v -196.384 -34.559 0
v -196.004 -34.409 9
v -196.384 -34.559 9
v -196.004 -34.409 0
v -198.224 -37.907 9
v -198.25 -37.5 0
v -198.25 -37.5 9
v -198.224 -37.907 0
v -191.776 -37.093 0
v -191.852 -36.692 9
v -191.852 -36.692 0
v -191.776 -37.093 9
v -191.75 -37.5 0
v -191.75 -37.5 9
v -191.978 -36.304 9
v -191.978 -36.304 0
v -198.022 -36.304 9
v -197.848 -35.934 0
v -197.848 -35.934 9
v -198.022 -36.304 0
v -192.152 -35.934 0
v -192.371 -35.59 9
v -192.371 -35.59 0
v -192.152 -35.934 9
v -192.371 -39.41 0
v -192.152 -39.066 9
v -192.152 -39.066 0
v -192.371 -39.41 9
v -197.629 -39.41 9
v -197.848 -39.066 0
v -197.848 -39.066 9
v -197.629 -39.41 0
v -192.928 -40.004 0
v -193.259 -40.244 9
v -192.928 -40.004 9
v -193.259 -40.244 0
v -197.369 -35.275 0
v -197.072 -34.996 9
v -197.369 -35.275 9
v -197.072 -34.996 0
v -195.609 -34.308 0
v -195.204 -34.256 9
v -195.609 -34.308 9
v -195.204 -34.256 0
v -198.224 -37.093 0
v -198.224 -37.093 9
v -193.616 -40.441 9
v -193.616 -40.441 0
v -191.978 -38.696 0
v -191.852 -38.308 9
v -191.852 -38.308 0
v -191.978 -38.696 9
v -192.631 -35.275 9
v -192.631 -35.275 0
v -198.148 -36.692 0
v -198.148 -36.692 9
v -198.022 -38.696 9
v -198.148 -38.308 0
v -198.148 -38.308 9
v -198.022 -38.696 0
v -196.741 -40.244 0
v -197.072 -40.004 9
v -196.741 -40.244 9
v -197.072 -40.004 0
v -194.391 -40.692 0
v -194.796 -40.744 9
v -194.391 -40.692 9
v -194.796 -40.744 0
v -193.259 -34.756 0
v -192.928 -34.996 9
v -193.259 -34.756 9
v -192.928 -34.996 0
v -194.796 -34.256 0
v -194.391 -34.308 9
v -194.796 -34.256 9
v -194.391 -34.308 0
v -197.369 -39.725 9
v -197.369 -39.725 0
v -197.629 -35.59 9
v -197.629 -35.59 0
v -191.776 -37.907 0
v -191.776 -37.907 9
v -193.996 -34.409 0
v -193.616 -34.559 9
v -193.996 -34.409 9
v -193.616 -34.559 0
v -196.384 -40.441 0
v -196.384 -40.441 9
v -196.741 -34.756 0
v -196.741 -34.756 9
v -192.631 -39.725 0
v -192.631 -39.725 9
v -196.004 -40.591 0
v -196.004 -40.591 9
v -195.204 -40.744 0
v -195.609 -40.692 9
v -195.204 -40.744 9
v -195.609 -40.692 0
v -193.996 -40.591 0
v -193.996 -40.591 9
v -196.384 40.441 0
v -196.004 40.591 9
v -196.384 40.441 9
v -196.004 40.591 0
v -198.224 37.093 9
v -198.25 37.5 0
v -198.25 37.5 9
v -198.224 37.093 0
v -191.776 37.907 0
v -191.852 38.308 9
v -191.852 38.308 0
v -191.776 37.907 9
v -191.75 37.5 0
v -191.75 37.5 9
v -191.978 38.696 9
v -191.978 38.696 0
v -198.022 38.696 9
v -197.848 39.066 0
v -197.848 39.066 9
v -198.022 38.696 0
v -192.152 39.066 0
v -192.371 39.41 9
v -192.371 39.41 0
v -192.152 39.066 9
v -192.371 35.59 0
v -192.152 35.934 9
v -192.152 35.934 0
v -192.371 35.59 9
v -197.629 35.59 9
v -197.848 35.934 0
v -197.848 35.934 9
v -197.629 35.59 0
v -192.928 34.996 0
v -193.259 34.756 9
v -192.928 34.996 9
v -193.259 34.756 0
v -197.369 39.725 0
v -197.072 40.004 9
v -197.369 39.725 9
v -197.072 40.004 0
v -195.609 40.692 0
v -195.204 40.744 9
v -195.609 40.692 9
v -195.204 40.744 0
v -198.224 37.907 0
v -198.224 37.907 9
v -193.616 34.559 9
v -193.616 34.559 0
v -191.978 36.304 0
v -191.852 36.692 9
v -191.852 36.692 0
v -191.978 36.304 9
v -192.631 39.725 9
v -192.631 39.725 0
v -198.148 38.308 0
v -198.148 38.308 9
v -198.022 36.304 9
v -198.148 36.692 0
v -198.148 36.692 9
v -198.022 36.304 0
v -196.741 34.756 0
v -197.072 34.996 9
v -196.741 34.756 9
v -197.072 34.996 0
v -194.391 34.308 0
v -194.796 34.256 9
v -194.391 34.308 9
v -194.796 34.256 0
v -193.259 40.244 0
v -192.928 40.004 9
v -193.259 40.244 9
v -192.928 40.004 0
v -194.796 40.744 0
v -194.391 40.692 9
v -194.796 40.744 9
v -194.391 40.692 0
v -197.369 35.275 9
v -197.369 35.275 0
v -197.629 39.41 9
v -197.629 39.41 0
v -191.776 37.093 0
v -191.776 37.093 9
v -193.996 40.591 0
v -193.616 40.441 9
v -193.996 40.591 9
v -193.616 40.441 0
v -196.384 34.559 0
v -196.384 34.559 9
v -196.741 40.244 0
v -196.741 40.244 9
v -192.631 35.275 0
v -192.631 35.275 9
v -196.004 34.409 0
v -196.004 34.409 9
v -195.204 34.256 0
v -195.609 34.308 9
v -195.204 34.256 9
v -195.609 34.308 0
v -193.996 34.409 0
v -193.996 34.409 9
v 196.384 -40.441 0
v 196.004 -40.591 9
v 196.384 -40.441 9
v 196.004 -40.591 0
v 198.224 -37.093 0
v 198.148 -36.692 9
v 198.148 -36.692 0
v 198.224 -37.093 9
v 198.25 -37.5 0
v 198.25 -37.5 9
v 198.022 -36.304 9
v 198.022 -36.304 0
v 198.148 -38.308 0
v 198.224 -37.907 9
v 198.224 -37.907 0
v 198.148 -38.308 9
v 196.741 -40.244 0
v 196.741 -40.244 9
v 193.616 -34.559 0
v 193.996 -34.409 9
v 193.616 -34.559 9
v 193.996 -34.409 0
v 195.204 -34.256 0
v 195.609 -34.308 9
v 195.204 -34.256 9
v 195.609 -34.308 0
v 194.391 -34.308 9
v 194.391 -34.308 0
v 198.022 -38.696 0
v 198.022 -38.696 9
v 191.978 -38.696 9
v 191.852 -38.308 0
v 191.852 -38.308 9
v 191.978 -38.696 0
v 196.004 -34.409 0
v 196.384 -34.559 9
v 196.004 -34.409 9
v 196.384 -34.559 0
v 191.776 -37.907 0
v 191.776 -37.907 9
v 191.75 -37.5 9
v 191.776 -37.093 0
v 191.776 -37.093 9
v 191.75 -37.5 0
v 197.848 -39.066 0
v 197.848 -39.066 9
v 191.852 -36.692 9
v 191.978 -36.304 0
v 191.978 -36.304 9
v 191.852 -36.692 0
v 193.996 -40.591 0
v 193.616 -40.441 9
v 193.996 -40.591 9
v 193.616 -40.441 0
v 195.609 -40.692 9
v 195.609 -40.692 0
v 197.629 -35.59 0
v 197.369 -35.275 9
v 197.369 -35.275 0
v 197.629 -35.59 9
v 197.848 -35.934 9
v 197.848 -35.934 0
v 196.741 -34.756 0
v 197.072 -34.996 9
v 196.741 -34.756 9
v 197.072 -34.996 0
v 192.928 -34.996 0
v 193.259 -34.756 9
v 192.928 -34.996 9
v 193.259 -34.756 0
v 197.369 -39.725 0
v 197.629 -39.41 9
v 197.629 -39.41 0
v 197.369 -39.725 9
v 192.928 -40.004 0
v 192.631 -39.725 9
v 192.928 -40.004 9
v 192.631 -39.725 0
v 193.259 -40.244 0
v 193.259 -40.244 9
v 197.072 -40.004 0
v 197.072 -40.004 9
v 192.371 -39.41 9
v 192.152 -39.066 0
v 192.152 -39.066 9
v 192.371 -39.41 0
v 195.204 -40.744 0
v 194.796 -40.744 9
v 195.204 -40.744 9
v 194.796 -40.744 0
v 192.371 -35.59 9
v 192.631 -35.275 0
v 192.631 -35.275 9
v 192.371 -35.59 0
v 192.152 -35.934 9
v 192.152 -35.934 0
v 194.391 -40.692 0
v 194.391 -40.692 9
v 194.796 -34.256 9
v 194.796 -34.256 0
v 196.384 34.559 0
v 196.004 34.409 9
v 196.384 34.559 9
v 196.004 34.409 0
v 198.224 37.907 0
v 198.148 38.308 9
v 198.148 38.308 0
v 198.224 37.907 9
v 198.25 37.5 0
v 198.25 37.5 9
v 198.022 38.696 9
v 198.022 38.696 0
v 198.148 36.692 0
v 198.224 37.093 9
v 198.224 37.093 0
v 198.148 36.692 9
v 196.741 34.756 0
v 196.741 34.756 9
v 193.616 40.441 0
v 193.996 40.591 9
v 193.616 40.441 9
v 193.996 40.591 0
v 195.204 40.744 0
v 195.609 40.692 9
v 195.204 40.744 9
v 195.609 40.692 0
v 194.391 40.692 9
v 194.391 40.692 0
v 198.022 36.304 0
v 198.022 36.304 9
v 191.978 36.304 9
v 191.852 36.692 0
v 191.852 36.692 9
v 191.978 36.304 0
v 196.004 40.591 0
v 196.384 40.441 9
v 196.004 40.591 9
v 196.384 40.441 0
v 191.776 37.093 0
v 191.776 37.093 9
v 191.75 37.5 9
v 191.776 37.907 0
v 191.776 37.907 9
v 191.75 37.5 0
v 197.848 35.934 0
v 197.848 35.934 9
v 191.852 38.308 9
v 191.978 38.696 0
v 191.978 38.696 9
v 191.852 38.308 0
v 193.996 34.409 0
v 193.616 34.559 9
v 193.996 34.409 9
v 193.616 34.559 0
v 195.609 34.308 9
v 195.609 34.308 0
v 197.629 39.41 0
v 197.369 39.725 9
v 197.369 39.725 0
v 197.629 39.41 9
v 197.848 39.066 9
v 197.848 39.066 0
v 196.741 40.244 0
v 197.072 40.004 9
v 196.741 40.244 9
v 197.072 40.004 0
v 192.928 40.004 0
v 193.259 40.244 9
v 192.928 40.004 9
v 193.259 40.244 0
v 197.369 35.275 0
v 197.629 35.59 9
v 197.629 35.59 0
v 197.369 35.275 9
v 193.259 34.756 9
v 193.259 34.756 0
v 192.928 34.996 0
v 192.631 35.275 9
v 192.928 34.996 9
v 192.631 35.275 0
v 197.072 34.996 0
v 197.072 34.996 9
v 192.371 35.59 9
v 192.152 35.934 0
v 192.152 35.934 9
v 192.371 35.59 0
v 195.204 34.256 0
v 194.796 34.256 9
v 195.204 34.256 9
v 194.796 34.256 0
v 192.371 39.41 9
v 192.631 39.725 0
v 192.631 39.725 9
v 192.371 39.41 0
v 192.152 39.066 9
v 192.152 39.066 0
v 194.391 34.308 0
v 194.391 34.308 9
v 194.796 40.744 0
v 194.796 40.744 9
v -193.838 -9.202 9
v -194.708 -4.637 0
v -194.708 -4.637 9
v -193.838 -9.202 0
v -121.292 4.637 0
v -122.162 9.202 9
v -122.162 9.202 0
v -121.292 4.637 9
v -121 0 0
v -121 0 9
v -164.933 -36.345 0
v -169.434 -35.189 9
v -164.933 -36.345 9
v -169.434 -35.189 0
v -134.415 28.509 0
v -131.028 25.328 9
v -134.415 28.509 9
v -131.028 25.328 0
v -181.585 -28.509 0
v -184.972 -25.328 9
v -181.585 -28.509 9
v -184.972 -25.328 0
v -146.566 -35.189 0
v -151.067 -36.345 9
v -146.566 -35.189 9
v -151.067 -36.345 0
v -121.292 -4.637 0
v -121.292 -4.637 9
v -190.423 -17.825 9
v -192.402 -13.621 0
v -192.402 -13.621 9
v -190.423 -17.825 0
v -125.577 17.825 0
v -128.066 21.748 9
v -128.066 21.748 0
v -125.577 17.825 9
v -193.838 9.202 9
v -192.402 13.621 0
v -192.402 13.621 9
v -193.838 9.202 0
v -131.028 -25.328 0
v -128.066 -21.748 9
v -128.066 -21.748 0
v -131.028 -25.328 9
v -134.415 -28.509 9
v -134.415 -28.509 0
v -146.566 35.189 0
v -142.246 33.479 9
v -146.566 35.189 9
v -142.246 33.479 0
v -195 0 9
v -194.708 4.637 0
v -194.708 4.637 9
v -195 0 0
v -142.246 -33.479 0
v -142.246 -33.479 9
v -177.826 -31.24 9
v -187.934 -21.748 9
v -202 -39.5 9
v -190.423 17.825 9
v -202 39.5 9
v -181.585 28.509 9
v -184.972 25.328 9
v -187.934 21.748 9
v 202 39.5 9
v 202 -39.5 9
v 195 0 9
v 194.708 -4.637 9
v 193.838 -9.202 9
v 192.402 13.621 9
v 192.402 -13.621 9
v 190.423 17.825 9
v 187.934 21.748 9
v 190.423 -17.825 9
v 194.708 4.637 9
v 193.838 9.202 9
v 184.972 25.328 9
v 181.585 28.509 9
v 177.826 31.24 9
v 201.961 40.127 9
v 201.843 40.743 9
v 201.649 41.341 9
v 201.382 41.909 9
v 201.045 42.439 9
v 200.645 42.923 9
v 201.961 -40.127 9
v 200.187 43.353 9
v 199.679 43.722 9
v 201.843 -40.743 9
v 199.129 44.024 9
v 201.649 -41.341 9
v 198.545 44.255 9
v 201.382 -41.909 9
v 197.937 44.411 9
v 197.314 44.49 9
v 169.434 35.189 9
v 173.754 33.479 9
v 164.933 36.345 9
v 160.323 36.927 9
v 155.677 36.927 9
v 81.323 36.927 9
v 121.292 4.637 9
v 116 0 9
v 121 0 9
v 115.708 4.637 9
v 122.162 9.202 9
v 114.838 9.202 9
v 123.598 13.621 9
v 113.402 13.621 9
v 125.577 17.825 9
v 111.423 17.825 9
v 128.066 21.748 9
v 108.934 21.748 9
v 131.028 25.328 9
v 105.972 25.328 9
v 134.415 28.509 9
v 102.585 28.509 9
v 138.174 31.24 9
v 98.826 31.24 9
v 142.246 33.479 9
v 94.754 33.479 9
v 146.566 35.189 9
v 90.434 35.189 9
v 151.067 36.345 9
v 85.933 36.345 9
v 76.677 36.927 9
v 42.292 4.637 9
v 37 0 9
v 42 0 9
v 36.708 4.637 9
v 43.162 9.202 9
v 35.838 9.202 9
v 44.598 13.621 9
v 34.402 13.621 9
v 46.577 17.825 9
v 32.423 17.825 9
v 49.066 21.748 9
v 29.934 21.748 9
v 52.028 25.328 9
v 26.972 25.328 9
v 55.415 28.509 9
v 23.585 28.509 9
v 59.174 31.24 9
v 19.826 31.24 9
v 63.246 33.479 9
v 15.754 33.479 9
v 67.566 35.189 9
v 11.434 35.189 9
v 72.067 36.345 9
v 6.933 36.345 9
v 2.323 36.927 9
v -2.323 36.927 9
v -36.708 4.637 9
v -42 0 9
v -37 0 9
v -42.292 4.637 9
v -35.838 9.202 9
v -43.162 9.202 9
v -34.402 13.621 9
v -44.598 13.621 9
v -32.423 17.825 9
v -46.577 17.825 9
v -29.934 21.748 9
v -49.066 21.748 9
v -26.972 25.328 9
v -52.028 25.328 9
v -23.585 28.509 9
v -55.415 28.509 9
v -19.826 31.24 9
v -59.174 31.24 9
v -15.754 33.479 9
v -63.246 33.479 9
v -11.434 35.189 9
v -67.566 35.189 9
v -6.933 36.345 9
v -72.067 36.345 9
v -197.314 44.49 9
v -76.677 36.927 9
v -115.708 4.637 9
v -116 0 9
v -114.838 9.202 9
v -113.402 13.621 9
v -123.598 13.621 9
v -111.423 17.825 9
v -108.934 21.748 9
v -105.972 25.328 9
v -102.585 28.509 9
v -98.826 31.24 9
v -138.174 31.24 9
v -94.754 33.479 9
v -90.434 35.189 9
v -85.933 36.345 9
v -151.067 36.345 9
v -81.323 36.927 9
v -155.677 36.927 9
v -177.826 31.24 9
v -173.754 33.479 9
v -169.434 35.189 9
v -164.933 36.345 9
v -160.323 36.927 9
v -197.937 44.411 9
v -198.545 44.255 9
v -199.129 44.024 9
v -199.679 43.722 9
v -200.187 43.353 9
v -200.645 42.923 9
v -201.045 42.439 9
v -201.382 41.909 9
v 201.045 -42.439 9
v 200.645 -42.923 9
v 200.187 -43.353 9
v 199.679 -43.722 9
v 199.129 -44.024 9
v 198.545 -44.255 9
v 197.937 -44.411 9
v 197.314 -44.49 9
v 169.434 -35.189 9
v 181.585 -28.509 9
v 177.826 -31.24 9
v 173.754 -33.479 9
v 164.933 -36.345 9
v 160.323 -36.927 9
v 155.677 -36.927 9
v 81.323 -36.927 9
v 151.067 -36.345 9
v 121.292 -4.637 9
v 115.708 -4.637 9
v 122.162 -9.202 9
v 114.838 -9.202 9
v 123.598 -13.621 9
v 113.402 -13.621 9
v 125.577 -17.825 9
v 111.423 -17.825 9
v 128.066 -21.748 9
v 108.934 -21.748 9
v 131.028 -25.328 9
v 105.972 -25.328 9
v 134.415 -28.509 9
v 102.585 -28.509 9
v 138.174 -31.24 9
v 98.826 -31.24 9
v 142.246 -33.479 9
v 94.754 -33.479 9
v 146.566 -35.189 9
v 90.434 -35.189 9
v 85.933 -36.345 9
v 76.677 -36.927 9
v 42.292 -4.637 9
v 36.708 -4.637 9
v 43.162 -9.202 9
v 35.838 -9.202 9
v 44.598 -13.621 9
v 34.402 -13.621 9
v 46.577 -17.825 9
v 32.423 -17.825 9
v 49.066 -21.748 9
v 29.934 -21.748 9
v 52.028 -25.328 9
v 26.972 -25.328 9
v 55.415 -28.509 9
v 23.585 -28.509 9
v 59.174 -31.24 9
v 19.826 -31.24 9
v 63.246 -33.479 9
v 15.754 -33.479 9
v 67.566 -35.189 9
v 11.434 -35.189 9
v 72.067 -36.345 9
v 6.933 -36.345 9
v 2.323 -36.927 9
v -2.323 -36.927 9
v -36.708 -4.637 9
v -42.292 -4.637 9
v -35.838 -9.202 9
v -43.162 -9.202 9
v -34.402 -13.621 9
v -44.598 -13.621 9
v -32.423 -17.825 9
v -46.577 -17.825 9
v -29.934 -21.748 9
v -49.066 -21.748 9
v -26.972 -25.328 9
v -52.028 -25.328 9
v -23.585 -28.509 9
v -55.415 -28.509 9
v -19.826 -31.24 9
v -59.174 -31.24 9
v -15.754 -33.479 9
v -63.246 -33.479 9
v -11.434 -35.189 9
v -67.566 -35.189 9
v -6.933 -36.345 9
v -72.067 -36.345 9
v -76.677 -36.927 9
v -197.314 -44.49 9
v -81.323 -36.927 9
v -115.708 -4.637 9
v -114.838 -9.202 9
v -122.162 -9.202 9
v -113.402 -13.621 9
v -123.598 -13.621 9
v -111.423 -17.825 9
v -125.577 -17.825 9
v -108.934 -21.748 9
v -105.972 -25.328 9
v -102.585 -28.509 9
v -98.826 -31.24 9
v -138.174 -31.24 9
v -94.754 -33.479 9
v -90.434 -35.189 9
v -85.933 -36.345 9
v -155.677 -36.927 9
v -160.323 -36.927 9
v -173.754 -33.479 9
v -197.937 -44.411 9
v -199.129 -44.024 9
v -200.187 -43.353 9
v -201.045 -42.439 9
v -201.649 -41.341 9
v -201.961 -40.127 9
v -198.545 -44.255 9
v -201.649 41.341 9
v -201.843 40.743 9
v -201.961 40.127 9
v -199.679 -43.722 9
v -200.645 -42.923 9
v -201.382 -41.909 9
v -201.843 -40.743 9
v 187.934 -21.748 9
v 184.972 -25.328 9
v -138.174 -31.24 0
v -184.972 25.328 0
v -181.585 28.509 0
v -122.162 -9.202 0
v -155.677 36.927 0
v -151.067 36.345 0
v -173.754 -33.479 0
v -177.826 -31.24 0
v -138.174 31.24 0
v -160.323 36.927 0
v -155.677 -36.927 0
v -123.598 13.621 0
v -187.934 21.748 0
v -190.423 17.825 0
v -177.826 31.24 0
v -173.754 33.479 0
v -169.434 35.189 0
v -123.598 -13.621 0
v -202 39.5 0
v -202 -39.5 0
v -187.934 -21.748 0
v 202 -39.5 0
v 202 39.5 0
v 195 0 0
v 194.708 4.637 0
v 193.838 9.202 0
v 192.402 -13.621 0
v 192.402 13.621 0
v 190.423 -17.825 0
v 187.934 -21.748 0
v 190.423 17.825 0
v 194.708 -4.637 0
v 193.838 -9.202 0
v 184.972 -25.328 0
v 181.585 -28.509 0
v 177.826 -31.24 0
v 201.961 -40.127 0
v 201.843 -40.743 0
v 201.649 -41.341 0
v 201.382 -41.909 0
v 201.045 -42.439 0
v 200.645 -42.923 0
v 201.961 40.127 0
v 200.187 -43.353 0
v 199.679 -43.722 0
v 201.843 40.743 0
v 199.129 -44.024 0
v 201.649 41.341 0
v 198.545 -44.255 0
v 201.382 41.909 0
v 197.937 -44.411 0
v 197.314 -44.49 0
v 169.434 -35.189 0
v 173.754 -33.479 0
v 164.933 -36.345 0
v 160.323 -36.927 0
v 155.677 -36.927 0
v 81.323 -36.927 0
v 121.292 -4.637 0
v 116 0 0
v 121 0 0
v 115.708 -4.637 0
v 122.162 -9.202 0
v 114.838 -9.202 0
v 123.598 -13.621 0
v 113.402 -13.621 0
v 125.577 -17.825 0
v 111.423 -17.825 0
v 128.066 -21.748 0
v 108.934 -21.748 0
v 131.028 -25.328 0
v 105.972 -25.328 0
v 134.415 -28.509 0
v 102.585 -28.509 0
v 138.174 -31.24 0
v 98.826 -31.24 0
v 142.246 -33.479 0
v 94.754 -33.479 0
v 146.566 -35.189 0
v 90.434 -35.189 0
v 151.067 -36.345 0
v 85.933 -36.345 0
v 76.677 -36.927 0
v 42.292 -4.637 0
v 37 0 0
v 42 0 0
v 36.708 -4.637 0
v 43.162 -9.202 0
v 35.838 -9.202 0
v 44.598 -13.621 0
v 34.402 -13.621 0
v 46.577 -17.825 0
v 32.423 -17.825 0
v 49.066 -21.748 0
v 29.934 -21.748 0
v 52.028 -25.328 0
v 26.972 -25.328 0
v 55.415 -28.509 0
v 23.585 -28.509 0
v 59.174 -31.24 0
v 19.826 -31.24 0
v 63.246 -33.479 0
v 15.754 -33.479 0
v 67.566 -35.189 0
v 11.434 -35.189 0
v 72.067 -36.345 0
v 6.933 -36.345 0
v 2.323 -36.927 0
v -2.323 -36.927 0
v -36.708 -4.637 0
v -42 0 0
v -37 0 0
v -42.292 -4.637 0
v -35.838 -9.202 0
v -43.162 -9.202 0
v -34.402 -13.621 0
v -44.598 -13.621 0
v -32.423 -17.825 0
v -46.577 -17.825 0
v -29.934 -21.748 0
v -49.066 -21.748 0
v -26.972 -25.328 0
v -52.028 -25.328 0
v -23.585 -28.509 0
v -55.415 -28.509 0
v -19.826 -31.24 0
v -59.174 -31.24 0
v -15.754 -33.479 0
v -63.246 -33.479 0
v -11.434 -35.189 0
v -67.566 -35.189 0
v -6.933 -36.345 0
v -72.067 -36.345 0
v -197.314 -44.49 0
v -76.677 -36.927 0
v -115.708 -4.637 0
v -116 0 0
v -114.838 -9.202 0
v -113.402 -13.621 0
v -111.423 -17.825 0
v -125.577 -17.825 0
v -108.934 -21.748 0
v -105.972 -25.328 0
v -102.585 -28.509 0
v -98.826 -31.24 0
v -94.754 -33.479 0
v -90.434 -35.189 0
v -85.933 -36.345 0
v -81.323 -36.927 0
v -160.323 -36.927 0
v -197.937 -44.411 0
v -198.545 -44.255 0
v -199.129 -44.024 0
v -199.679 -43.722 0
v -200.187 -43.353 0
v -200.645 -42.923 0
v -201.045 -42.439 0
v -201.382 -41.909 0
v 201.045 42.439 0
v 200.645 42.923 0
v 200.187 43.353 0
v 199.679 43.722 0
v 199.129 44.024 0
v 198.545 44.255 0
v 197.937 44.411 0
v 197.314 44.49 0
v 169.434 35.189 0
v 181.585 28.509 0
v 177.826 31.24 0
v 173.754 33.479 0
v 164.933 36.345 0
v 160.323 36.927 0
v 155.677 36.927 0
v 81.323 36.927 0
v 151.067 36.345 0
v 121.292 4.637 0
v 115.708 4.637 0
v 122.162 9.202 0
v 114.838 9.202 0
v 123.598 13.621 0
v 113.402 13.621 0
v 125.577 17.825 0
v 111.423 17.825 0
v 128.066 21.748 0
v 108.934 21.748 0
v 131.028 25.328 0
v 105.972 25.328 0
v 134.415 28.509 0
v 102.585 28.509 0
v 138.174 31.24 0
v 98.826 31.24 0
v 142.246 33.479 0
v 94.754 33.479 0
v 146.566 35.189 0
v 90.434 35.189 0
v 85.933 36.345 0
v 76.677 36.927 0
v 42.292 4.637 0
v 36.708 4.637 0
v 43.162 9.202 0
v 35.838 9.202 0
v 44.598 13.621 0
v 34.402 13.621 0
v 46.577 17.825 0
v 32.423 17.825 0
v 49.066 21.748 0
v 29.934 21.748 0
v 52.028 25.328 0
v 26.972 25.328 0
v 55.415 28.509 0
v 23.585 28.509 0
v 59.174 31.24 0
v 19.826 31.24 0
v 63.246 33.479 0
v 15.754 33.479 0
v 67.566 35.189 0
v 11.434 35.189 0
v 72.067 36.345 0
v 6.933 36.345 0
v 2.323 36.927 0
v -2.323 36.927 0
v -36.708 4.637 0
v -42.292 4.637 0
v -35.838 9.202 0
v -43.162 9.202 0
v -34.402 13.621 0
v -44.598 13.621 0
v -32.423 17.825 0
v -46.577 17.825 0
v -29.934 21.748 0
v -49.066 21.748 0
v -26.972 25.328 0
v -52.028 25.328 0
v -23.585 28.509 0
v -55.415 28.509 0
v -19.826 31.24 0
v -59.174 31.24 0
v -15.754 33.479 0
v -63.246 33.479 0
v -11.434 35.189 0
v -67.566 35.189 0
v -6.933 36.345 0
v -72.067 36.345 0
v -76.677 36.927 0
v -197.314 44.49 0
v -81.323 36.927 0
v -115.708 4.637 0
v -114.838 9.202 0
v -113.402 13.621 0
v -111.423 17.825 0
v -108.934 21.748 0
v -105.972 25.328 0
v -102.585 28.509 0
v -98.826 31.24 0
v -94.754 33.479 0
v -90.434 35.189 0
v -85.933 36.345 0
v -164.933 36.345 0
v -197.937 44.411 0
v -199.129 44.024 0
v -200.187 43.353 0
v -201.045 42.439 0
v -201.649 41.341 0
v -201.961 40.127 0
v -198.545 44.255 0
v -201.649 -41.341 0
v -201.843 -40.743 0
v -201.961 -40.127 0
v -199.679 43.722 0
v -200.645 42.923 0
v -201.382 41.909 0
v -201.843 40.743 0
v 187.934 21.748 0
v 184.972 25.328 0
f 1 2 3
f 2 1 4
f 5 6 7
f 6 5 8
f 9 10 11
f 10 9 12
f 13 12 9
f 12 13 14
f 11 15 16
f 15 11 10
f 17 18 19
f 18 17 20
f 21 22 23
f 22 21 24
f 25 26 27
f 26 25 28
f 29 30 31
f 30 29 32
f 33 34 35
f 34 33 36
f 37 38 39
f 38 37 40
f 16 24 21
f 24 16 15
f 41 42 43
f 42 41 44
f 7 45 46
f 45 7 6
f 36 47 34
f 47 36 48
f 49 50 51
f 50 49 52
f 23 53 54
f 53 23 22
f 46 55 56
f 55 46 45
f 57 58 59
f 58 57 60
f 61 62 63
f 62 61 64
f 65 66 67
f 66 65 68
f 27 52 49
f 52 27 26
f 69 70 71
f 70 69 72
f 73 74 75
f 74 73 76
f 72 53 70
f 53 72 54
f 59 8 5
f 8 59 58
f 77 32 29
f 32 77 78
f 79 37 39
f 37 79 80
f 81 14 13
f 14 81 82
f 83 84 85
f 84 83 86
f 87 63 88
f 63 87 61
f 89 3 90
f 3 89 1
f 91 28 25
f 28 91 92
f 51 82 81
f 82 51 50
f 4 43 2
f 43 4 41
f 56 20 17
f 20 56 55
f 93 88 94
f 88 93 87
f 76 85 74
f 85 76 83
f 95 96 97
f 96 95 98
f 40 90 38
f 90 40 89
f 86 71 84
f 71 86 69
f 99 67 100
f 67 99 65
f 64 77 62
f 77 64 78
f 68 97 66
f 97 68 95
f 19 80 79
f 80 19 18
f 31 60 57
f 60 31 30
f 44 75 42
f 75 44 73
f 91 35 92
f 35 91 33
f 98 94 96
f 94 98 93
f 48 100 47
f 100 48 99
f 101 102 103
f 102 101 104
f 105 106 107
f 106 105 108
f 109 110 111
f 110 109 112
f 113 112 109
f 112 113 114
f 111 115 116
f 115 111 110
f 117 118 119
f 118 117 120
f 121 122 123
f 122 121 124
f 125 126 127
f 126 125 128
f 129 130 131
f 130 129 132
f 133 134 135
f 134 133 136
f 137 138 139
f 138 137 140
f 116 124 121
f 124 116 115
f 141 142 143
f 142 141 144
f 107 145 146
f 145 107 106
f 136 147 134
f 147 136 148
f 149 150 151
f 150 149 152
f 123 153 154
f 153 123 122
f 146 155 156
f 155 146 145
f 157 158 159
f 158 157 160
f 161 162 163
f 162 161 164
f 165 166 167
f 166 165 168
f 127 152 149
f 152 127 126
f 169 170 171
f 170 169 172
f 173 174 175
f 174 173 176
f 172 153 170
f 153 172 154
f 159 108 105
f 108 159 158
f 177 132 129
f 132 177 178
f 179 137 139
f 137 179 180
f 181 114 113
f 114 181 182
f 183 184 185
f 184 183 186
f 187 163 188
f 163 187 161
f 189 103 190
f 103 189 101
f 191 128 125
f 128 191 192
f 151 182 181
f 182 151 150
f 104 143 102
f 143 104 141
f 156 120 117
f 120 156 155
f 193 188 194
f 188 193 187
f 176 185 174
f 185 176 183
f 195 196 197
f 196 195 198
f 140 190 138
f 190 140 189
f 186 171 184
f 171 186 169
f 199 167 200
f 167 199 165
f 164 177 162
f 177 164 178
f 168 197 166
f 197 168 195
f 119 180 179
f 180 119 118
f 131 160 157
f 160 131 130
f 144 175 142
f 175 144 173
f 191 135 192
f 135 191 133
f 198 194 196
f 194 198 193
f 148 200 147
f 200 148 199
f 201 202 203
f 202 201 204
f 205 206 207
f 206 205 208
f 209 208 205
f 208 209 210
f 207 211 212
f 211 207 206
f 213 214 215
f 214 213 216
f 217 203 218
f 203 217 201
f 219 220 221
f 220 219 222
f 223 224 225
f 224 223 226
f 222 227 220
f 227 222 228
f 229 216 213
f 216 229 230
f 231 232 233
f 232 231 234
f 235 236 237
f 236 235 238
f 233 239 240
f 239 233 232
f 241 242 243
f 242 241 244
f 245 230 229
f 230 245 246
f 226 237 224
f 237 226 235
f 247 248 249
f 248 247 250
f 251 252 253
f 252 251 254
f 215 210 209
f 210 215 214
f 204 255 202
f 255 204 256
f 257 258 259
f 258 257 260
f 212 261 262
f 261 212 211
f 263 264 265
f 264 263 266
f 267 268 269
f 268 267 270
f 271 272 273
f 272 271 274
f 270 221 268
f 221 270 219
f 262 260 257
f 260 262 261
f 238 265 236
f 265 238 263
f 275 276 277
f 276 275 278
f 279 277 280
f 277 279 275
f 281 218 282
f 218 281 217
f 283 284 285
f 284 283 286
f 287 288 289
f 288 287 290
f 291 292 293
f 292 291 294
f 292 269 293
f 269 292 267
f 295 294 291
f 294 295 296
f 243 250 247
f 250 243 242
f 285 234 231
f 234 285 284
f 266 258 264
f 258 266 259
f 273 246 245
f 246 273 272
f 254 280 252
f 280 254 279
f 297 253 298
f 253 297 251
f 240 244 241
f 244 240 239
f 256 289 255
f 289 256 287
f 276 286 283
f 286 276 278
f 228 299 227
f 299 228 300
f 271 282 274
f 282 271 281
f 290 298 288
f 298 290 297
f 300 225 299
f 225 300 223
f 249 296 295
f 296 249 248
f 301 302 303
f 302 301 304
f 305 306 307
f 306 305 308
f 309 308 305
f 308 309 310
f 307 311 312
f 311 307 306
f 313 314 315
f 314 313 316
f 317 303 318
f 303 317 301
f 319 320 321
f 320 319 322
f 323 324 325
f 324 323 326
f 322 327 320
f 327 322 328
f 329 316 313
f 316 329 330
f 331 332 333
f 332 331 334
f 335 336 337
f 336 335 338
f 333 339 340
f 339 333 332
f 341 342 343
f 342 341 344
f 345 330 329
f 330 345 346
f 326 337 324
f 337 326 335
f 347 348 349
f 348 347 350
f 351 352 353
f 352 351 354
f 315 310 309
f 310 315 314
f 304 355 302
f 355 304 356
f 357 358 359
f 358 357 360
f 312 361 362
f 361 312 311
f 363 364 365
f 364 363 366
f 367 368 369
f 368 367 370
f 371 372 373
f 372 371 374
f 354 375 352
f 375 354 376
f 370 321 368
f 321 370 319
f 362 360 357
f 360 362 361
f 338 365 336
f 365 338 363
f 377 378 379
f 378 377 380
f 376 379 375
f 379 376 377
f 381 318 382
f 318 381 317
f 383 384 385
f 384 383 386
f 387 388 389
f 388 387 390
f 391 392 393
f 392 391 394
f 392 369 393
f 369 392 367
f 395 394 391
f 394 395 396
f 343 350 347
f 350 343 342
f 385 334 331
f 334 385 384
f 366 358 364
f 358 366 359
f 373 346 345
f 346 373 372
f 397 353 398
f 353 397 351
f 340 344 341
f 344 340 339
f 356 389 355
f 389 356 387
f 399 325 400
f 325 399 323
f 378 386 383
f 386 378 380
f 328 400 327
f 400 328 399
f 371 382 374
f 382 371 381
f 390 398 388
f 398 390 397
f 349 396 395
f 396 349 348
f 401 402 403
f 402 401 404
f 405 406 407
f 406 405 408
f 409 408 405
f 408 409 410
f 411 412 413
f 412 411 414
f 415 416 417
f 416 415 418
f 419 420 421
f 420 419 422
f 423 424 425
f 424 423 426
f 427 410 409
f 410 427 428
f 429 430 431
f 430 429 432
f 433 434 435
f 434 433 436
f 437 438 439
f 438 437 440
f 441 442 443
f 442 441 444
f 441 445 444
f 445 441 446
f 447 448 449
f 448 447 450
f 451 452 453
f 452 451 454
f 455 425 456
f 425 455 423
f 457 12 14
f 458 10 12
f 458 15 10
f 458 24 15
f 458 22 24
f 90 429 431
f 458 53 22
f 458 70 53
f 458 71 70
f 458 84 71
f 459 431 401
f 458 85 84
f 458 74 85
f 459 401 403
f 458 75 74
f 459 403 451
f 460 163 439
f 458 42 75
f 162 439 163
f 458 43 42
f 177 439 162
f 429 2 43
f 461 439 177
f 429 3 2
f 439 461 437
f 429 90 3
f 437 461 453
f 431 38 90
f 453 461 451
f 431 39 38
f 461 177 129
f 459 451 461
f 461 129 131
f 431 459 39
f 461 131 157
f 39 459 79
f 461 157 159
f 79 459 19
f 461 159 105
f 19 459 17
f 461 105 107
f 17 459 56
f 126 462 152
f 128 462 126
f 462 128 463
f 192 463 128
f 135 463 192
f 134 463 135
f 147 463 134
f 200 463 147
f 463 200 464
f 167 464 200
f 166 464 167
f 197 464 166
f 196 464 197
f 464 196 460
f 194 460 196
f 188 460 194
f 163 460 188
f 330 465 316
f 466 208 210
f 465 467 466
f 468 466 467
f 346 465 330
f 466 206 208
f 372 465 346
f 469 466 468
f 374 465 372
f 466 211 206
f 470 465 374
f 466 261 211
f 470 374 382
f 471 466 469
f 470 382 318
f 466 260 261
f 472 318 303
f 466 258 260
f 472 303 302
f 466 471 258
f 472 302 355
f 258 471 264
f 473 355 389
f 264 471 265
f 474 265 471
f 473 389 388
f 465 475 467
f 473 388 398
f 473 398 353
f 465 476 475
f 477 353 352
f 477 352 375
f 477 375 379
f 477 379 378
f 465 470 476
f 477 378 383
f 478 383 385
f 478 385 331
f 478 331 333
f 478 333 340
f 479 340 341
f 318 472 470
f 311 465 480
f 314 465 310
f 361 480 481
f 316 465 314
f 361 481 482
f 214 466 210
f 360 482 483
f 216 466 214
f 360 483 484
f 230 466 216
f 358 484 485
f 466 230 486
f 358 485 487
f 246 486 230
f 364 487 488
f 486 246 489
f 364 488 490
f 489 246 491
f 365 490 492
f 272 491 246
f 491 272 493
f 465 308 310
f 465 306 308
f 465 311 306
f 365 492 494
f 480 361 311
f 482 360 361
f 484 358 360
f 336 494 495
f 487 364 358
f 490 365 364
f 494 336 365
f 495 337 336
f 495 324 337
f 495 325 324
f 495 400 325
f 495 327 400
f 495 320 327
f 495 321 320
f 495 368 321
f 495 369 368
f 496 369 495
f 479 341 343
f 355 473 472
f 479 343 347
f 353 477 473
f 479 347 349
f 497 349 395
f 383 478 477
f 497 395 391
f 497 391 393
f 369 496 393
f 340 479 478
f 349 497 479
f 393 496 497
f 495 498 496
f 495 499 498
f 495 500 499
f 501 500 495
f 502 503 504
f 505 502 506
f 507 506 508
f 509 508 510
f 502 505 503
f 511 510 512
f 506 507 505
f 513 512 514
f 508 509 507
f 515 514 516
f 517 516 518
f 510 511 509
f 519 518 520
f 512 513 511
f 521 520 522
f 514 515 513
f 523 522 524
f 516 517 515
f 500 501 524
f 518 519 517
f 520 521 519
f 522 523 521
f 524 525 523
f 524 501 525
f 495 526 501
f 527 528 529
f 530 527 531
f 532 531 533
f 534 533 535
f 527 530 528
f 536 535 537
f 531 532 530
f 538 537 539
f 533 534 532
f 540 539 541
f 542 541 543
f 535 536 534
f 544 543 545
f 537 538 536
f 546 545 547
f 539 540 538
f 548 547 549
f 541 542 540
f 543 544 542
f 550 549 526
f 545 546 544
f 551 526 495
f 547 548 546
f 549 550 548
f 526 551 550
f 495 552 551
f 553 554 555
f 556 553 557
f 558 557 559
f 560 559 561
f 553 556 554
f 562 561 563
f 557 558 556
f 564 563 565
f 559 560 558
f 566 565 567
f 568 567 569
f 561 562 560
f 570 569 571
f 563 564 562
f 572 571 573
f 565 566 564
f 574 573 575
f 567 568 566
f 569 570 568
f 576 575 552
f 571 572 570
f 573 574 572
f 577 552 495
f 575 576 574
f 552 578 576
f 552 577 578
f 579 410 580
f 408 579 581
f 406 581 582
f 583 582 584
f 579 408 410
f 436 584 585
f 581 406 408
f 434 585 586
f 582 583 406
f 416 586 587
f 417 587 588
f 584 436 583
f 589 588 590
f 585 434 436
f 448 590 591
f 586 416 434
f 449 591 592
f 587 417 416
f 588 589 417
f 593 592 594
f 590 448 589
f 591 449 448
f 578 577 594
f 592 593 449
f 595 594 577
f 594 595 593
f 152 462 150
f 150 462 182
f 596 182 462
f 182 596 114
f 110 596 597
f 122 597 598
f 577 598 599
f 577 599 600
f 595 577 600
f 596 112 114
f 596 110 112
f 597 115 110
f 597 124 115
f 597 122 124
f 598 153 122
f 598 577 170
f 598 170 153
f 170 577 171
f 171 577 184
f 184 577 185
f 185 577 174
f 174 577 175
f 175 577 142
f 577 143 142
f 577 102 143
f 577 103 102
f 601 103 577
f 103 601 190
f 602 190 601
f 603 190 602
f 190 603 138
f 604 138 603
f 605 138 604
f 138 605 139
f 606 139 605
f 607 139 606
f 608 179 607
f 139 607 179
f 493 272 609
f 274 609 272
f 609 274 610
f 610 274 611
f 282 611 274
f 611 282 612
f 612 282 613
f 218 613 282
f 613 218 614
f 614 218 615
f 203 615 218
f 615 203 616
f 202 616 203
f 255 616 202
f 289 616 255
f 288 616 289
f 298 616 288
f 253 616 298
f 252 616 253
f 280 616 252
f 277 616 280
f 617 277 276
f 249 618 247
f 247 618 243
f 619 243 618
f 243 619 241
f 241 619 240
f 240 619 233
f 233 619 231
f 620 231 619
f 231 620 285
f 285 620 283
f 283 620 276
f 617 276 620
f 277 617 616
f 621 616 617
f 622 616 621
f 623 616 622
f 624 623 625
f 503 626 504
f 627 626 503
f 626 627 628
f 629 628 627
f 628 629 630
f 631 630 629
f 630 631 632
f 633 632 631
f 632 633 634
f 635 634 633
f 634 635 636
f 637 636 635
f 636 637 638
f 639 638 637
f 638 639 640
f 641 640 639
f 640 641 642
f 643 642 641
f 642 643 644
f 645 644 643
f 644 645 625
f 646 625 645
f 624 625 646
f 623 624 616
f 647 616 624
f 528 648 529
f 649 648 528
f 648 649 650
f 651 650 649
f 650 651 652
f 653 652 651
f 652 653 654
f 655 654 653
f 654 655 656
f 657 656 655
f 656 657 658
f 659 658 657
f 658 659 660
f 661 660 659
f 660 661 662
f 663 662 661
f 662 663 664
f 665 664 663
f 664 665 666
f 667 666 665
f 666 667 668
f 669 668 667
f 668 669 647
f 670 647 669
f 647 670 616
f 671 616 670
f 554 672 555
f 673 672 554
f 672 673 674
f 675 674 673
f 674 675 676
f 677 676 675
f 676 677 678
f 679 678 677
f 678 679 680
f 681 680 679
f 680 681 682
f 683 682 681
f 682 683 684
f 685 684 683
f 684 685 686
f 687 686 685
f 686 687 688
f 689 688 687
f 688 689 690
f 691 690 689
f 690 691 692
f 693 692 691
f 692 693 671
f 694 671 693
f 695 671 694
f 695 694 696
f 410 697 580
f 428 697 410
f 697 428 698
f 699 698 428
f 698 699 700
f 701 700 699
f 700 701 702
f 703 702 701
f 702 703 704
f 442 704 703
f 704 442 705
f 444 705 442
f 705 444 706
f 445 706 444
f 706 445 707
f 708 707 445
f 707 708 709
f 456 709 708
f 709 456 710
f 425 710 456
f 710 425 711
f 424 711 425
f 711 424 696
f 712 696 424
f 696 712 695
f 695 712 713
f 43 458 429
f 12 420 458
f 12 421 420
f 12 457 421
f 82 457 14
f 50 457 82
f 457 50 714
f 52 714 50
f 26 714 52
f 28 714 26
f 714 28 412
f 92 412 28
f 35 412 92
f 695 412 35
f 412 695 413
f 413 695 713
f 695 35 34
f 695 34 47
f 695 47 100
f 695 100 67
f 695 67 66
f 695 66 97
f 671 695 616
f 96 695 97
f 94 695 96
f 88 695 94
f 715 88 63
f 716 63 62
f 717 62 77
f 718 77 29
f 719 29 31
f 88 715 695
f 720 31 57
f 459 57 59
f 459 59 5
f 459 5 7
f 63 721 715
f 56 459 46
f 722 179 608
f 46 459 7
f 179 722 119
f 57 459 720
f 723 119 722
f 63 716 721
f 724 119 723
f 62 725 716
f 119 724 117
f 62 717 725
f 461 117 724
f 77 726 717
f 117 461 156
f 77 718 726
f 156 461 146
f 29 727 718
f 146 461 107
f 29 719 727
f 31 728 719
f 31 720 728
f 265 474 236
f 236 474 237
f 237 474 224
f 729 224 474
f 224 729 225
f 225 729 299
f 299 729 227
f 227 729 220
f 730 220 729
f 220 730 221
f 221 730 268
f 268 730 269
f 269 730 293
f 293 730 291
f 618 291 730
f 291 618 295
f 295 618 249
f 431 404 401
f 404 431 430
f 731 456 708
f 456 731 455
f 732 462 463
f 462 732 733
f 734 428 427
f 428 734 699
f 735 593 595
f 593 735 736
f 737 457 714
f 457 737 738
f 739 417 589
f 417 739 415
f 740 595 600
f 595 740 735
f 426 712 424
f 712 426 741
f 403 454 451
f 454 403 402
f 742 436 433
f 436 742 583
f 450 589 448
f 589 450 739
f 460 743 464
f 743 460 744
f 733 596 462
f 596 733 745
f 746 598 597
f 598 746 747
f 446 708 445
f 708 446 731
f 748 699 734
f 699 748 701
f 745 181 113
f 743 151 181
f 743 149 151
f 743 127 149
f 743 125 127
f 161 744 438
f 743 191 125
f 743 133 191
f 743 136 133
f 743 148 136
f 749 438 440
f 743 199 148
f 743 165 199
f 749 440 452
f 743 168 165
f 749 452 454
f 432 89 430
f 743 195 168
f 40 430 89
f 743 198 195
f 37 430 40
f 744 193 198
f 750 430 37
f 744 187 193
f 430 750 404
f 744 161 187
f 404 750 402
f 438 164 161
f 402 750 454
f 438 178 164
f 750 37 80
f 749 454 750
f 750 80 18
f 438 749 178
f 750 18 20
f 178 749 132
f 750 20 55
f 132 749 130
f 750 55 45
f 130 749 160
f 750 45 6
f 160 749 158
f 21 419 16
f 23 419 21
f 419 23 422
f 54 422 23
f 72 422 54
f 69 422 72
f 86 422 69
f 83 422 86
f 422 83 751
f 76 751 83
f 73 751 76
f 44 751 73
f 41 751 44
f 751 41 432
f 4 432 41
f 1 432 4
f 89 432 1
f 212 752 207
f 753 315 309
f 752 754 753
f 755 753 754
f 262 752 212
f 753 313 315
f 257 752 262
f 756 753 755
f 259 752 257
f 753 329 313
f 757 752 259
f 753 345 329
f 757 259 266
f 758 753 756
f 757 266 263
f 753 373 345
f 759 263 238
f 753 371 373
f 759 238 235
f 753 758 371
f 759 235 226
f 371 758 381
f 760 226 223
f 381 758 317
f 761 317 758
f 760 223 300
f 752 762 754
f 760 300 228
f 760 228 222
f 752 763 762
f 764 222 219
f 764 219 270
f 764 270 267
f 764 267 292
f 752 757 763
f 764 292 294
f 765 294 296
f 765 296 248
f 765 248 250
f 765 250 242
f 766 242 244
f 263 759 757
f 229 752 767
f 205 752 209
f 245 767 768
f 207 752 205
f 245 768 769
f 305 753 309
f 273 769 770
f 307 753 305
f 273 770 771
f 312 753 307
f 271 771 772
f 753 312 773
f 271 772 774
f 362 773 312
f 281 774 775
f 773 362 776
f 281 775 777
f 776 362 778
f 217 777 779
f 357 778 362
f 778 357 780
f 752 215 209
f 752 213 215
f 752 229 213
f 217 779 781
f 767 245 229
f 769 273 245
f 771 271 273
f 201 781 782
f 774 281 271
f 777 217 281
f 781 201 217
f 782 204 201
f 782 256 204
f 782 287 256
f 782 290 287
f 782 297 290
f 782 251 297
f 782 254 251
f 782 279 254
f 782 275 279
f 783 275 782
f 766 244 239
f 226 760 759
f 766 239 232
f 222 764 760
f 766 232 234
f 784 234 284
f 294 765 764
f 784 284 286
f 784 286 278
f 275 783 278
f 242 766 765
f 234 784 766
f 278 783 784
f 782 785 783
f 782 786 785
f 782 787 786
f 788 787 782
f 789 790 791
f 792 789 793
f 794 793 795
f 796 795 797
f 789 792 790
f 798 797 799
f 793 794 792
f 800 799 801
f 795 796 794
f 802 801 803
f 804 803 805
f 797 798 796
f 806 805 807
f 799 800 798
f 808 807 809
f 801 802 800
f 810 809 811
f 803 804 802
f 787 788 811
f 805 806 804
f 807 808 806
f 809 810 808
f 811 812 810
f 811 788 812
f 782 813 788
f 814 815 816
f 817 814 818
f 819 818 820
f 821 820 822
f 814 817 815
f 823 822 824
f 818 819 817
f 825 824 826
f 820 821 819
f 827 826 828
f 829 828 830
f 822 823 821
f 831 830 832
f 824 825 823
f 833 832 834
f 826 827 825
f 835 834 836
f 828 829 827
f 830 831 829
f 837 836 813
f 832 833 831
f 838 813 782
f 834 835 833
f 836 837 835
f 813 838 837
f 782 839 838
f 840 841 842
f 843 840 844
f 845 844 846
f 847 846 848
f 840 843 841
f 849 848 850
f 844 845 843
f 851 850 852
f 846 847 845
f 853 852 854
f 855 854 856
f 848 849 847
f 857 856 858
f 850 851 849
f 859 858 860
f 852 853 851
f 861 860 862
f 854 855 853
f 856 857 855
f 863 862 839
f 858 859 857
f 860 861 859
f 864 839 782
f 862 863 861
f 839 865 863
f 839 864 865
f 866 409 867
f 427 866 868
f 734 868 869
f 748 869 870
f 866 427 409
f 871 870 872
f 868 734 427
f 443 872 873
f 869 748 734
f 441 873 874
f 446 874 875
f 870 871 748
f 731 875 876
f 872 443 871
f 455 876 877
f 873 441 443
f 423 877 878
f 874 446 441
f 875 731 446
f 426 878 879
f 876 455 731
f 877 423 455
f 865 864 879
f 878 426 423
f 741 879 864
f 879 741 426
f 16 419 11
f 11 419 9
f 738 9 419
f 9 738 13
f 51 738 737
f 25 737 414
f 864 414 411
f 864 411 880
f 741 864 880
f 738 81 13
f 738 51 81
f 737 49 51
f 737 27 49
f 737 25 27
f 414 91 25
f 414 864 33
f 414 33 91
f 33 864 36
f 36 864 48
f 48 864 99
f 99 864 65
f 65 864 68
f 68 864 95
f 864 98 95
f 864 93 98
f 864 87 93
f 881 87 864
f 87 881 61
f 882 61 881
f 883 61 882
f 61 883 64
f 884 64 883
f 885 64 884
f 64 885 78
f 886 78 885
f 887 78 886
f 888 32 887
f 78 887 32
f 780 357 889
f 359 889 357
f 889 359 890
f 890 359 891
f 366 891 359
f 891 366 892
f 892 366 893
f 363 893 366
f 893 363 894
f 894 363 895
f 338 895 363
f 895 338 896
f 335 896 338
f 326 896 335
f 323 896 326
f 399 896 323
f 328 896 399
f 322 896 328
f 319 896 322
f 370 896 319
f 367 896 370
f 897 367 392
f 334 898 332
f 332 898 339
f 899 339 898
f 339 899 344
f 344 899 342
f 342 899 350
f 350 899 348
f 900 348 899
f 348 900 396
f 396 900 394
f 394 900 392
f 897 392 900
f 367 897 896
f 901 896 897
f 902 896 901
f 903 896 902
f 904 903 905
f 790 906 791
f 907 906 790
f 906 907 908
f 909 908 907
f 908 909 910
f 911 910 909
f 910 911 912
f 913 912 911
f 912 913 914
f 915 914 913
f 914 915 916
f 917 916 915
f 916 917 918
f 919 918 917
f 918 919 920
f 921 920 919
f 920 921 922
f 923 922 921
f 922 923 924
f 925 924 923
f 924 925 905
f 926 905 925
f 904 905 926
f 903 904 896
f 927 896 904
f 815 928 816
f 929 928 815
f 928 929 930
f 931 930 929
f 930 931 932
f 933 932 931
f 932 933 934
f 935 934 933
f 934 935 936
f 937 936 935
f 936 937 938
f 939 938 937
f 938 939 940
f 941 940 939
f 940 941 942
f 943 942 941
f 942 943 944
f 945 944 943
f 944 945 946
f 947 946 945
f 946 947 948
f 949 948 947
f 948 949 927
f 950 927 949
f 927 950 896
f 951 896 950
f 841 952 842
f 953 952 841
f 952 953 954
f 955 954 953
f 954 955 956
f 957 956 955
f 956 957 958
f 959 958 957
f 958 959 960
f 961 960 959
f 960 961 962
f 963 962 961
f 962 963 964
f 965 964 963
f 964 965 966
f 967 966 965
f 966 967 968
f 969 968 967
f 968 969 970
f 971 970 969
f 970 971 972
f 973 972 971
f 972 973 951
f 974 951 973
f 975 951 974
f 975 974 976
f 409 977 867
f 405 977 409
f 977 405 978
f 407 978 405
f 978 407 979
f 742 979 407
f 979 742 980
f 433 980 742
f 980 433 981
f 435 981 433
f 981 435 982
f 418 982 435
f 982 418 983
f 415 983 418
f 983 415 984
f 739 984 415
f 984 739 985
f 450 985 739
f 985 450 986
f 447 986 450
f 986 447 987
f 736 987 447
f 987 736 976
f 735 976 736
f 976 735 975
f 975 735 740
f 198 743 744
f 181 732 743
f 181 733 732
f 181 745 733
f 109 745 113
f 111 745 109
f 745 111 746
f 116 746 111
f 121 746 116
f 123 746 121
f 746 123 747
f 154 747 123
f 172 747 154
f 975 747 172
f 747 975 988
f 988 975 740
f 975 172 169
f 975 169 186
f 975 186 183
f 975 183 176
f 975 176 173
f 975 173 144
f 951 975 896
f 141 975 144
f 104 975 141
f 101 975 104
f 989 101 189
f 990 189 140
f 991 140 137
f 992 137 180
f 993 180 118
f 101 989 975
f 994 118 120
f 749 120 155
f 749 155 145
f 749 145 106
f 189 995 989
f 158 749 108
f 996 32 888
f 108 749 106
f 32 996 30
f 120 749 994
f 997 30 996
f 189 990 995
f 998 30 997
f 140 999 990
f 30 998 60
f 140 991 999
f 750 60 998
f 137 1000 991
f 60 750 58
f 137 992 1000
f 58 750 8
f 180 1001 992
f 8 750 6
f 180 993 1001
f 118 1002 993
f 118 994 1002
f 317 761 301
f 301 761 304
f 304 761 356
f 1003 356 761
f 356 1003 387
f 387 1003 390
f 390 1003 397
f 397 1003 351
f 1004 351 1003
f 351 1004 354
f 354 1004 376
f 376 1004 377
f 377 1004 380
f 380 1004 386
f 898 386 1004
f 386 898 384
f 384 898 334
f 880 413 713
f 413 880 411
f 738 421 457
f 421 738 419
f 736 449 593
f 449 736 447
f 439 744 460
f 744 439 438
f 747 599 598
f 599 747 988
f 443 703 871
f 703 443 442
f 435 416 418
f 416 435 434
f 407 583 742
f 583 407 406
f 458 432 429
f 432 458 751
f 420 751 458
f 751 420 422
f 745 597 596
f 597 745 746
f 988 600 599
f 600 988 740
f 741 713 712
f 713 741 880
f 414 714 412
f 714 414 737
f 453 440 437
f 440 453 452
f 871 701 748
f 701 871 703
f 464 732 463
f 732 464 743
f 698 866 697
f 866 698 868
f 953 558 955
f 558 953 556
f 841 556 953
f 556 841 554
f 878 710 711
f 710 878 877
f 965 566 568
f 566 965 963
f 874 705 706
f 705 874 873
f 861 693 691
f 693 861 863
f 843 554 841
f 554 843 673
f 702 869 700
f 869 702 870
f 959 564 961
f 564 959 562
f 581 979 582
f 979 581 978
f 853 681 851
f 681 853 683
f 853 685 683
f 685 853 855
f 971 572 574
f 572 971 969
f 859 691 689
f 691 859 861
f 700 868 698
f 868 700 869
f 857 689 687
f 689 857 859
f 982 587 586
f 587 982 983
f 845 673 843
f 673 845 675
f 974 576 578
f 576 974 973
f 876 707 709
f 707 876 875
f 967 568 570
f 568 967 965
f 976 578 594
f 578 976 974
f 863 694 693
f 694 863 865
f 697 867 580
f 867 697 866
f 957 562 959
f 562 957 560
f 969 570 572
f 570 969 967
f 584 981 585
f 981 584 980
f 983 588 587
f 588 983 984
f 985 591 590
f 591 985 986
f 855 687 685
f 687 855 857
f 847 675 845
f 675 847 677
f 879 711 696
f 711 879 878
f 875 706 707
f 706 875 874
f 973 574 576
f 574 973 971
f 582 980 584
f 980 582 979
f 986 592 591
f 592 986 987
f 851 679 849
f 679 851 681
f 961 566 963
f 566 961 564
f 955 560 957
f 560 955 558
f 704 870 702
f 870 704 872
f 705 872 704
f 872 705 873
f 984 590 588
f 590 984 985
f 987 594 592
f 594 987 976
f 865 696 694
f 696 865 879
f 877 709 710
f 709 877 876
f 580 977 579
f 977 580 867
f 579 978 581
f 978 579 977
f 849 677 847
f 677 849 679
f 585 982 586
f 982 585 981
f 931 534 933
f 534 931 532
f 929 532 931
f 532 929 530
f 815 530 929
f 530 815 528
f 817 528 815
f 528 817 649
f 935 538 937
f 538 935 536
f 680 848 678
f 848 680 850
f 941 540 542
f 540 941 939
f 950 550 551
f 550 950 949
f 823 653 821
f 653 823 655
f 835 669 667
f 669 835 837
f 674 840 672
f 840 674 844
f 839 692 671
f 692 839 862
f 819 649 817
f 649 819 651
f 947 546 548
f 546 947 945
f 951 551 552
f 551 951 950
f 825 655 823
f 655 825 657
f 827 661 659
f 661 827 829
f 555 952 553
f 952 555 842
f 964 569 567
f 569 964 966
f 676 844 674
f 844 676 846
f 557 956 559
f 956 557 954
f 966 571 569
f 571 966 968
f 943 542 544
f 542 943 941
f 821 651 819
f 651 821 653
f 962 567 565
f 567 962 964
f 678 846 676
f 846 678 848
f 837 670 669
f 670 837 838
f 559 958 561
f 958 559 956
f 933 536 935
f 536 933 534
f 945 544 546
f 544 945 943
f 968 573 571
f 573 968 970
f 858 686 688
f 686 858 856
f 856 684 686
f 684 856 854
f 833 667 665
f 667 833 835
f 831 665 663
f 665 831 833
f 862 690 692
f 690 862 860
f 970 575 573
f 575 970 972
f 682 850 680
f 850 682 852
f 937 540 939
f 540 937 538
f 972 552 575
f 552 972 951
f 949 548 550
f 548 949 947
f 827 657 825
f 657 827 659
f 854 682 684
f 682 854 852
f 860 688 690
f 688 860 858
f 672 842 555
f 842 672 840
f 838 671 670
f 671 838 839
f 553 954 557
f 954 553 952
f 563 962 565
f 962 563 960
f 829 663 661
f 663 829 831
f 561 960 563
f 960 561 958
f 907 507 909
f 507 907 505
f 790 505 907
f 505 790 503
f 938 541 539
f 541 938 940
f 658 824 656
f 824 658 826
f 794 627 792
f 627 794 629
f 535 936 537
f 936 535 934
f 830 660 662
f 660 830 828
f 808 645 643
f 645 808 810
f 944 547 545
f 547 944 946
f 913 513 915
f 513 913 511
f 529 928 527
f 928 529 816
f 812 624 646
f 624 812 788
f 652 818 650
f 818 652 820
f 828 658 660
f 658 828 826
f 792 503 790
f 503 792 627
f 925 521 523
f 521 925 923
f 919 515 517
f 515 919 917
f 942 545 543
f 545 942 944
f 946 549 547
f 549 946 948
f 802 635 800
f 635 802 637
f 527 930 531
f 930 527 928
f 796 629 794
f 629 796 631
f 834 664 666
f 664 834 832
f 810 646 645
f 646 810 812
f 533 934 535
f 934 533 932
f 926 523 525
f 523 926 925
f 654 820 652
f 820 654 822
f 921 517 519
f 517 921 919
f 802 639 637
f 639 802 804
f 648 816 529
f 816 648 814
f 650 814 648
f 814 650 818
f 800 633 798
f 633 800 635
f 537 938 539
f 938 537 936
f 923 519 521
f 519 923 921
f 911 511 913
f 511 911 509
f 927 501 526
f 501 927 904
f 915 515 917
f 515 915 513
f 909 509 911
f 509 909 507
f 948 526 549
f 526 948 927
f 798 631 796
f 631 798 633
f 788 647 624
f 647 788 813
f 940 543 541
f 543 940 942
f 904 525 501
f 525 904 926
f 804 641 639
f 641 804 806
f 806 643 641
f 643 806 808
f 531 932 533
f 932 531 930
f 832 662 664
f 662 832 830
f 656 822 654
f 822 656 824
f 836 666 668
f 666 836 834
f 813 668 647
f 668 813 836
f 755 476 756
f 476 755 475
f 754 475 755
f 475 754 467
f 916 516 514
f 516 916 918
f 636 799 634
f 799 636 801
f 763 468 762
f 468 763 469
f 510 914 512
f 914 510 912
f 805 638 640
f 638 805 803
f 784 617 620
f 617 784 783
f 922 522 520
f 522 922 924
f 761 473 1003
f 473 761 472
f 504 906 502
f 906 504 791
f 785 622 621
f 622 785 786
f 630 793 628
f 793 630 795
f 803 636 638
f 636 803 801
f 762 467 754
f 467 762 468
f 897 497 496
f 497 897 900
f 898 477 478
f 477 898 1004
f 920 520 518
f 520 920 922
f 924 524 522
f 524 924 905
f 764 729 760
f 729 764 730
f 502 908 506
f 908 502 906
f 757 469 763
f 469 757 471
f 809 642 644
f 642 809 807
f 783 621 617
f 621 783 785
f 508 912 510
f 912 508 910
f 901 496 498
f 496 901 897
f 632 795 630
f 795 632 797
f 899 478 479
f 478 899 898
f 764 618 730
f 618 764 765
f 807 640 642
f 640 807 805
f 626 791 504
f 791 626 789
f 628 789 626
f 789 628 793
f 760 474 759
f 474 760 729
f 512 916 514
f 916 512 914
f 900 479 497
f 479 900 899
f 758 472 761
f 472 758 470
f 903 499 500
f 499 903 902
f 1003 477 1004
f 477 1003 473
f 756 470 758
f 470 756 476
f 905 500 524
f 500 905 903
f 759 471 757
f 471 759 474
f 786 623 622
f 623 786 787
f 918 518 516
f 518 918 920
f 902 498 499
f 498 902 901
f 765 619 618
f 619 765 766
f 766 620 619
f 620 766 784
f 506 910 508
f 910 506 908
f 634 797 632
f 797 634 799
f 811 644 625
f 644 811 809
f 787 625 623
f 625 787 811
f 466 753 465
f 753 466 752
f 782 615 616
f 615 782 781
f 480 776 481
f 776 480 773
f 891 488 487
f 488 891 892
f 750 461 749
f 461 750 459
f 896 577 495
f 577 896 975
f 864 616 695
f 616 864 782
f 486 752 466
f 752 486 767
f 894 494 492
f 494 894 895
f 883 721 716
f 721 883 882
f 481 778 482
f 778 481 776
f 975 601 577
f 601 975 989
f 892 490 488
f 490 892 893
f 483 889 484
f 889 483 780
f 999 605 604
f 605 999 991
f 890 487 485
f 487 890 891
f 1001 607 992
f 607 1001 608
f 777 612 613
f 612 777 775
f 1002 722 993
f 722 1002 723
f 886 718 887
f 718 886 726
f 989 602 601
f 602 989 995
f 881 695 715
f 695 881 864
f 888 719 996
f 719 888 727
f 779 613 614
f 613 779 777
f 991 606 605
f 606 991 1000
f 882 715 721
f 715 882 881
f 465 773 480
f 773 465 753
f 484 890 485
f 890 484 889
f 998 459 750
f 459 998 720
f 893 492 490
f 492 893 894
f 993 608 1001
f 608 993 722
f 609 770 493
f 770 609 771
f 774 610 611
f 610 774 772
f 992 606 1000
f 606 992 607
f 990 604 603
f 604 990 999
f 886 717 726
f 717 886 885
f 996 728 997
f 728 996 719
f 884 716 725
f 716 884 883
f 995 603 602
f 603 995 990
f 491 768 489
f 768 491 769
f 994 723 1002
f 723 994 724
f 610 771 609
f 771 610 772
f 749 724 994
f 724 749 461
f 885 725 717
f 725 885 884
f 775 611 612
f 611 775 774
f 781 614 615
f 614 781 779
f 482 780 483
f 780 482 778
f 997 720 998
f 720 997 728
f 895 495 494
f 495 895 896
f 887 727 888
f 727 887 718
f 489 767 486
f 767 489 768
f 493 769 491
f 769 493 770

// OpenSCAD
$fn = 50;

difference() {
	union() {
		hull() {
			translate(v = [-197.0, 39.5, 0]) {
				cylinder(h = 9, r = 5);
			}
			translate(v = [197.0, 39.5, 0]) {
				cylinder(h = 9, r = 5);
			}
			translate(v = [-197.0, -39.5, 0]) {
				cylinder(h = 9, r = 5);
			}
			translate(v = [197.0, -39.5, 0]) {
				cylinder(h = 9, r = 5);
			}
		}
	}
	union() {
		translate(v = [-195.0, -37.5, -100.0]) {
			cylinder(h = 200, r = 3.25);
		}
		translate(v = [-195.0, 37.5, -100.0]) {
			cylinder(h = 200, r = 3.25);
		}
		translate(v = [195.0, -37.5, -100.0]) {
			cylinder(h = 200, r = 3.25);
		}
		translate(v = [195.0, 37.5, -100.0]) {
			cylinder(h = 200, r = 3.25);
		}
		translate(v = [-195.0, -37.5, -100.0]) {
			cylinder(h = 200, r = 1.8);
		}
		translate(v = [-195.0, 37.5, -100.0]) {
			cylinder(h = 200, r = 1.8);
		}
		translate(v = [195.0, -37.5, -100.0]) {
			cylinder(h = 200, r = 1.8);
		}
		translate(v = [195.0, 37.5, -100.0]) {
			cylinder(h = 200, r = 1.8);
		}
		translate(v = [-158.0, 0, 0.0]) {
			cylinder(h = 9, r = 37.0);
		}
		translate(v = [-79.0, 0, 0.0]) {
			cylinder(h = 9, r = 37.0);
		}
		cylinder(h = 9, r = 37.0);
		translate(v = [79.0, 0, 0.0]) {
			cylinder(h = 9, r = 37.0);
		}
		translate(v = [158.0, 0, 0.0]) {
			cylinder(h = 9, r = 37.0);
		}
	}
}
